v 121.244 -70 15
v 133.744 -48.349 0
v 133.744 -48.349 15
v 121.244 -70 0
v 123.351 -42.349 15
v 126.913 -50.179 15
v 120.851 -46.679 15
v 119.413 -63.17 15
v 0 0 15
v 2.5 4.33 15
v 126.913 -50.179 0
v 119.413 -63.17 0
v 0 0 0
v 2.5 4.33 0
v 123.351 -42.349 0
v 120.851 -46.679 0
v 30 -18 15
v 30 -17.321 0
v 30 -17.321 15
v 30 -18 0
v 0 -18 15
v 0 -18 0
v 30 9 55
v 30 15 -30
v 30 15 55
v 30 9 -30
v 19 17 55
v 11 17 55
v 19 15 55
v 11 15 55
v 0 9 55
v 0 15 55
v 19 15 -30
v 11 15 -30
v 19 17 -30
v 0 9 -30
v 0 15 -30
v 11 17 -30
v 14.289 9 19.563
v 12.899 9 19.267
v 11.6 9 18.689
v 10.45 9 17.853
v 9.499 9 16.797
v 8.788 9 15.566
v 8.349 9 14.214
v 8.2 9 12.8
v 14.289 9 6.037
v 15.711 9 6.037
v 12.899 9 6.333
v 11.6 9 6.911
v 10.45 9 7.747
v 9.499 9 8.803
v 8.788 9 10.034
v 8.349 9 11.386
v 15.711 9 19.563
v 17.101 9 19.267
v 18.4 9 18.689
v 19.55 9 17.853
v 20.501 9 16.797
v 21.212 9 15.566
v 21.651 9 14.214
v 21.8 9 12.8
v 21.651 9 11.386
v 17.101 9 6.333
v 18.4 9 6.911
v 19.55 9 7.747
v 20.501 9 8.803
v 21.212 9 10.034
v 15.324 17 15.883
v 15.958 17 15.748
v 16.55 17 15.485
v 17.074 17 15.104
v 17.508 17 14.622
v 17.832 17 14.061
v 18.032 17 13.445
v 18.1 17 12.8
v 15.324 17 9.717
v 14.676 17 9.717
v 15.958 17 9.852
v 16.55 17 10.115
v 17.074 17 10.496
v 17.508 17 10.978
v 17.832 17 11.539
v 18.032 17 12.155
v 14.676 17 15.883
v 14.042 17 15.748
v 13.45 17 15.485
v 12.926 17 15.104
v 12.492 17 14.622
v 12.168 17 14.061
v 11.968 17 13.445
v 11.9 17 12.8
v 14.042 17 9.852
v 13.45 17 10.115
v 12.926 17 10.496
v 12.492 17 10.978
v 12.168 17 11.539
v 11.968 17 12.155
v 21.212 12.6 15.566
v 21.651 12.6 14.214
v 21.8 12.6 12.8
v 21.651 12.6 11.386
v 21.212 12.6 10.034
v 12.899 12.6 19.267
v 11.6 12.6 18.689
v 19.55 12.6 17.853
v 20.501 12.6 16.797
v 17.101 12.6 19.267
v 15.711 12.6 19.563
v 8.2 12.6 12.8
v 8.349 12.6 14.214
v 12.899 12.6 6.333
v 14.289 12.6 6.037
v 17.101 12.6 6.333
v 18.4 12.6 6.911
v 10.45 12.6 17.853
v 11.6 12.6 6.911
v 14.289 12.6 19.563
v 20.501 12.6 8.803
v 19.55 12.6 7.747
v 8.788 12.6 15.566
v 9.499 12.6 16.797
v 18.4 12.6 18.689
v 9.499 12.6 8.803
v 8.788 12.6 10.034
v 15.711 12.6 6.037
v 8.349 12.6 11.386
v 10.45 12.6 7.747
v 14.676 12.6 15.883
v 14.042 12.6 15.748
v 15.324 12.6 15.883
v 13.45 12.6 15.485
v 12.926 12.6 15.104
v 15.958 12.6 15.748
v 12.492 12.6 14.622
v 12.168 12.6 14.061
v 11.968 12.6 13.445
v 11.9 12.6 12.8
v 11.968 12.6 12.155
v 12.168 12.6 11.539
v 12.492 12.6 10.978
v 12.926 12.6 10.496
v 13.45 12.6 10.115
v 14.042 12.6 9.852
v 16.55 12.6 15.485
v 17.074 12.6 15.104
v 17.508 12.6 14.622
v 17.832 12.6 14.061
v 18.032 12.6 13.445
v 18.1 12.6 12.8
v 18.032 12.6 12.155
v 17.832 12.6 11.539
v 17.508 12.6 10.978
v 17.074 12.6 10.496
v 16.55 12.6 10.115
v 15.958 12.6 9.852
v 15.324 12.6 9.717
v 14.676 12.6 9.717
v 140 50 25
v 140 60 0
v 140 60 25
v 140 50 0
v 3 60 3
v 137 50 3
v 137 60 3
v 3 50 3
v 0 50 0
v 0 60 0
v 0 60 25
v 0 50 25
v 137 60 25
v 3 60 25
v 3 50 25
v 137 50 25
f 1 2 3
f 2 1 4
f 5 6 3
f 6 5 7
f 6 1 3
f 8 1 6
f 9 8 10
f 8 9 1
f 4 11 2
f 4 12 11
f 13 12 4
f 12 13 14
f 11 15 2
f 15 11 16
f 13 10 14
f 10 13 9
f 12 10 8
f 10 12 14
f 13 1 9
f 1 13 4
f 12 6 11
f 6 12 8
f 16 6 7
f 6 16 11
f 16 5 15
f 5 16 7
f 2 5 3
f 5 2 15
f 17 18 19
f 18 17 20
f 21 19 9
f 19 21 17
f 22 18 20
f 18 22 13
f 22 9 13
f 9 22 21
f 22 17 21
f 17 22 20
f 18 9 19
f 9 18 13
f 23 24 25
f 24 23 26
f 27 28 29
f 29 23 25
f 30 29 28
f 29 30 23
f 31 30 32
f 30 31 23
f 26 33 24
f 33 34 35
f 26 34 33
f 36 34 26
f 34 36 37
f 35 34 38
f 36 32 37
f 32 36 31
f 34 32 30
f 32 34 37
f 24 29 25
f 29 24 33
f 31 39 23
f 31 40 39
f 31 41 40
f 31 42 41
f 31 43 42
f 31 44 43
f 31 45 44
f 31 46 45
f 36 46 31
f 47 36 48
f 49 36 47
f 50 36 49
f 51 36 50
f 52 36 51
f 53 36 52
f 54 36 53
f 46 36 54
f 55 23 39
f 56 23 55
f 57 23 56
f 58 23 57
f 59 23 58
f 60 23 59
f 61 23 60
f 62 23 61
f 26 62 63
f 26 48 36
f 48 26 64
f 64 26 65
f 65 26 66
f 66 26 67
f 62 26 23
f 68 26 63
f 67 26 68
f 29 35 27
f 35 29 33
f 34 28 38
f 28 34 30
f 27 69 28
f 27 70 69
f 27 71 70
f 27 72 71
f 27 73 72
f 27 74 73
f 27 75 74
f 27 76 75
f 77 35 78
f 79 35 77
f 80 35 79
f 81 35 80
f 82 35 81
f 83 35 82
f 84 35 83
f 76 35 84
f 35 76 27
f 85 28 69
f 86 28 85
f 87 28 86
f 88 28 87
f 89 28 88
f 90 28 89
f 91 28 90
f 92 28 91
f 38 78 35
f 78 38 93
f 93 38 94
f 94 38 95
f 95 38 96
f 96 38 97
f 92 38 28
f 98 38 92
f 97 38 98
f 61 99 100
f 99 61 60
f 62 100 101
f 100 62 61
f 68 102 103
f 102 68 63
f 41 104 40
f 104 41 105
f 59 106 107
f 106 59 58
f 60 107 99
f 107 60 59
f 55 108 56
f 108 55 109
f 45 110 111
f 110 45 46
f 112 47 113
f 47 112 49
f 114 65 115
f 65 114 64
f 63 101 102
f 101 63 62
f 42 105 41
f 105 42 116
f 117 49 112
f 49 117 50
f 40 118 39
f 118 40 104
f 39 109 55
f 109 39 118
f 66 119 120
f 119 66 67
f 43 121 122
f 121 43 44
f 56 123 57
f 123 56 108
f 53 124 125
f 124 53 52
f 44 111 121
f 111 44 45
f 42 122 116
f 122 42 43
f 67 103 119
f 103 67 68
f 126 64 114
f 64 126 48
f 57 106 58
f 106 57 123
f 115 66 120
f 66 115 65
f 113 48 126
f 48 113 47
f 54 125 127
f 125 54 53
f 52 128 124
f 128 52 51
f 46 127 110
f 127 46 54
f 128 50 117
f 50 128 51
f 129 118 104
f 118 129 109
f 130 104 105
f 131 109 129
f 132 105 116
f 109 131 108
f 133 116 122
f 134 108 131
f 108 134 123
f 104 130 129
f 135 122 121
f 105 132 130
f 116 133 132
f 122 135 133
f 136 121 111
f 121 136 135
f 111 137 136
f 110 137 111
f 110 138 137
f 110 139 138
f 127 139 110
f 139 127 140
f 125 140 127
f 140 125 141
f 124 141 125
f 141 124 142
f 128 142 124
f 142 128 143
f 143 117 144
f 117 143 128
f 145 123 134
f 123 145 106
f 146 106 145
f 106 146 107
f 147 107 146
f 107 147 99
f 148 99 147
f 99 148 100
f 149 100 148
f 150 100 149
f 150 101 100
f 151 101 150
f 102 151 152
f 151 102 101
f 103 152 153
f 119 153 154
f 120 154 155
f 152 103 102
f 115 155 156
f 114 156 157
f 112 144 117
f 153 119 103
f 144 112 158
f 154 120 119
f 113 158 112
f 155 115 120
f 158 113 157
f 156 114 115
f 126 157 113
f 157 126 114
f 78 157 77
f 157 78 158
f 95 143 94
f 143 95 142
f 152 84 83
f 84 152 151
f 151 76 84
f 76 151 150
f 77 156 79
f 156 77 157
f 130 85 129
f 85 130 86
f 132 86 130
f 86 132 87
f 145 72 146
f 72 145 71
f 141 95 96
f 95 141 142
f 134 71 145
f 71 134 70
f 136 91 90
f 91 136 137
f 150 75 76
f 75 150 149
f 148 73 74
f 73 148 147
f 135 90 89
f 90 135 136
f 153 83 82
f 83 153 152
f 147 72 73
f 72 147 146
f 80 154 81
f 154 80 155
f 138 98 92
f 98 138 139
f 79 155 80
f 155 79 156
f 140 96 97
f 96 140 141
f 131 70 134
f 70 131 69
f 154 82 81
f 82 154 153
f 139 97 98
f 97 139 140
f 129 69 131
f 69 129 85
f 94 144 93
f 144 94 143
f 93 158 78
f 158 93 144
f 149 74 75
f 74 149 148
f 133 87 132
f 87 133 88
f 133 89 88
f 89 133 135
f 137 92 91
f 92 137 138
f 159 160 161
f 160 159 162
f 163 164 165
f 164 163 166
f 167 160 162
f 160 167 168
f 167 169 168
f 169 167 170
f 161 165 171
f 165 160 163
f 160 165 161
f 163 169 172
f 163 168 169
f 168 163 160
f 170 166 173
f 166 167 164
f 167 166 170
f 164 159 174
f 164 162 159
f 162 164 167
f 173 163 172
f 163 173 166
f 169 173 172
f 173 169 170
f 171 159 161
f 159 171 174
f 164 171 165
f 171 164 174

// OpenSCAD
// file: ../configuration.scad
// Vyska vrstvy pro tisknuti dilu [mm]
layer_height = 0.3; //Slic3r->Print Settings->Layers and perimeters->Layer height

// Rezerva prumeru hlavy sroubu [mm]
spare = 1;
// Prumer hlavy M6 sroubu (pricte se rezerva) [mm]
M6_head_diameter = 12.6+spare;
//M6_head_diameter = 12+spare;

// Vyska hlavy M6 sroubu (dulezite pro zapusteni hlavy sroubu do plastu) [mm]
M6_head_height = 3.6;
//M6_head_height = 4.5;

// Delka motoru (ovlivni dily pro osy Z a Y)
//SX17-1003LQFE (doporuceno hlavne na osu Z)
motor_length = 29.5;
//SX17-1003 (doporuceno hlavne na osu Z)
//motor_length = 34;
//SX17-1005
//motor_length = 40;
//SX17-0905 - zde je jiz problem s velkou vyskou motoru na ose Z - musi se upravit endstop-holder
//motor_length = 48;

// Sirka vytlacovaneho materialu [mm]
extrusion_width = 0.66; //Slic3r->Print Settings->Advanced->Default extrusion width

/// Vyberte typ remenu ******************************************************

// GT2 
//belt_tooth_distance = 2;
//belt_tooth_ratio = 0.5;

// T2.5
belt_tooth_distance = 2.5;
belt_tooth_ratio = 0.68;
// main file
h=15;
rotate([0, 0, -30]) {cube([140, 5, h]);
	translate([135, 0, 0]) cube([5, 20, h]);
	translate([128, 20, 0]) cube([12, 5, h]);
}

difference(){
translate([0, -18, 0]) cube([30, 18, h]);
rotate([0, 0, -30]) cube([140, 50, h]);

}


// RebeliX
//
// RAMPS mini drzak
// GNU GPL v3
// Martin Neruda <neruda@reprap4u.cz>
// http://www.reprap4u.cz

include <../configuration.scad>

module bottom_holder_base(vyska,sirka,delka){
	// Pridelani do profilu
	translate([0,delka-6,-30]) cube([30,6,85]);
	// Vodici lista
	translate([15-4,delka,-30]) cube([8,2,85]);
}

module bottom_holder_cuts(vyska,delka,vyrez_sirka){
	// Otvor pro M6 sroub
	translate([15,delka-6+M6_head_height,vyska+M6_head_diameter/2]) rotate([90,0,0]) cylinder(r=M6_head_diameter/2,h=10,$fn=30);
	translate([15,0,vyska+M6_head_diameter/2]) rotate([-90,0,0]) cylinder(r=3.1,h=20,$fn=30);
}

difference(){
	bottom_holder_base(6,19,15);
	bottom_holder_cuts(6,15,40);
}

translate([0, 50, 0]) {
	cube([140, 10, 3]);
	cube([3, 10, 25]);
	translate([137, 0, 0]) cube([3, 10, 25]);
}
